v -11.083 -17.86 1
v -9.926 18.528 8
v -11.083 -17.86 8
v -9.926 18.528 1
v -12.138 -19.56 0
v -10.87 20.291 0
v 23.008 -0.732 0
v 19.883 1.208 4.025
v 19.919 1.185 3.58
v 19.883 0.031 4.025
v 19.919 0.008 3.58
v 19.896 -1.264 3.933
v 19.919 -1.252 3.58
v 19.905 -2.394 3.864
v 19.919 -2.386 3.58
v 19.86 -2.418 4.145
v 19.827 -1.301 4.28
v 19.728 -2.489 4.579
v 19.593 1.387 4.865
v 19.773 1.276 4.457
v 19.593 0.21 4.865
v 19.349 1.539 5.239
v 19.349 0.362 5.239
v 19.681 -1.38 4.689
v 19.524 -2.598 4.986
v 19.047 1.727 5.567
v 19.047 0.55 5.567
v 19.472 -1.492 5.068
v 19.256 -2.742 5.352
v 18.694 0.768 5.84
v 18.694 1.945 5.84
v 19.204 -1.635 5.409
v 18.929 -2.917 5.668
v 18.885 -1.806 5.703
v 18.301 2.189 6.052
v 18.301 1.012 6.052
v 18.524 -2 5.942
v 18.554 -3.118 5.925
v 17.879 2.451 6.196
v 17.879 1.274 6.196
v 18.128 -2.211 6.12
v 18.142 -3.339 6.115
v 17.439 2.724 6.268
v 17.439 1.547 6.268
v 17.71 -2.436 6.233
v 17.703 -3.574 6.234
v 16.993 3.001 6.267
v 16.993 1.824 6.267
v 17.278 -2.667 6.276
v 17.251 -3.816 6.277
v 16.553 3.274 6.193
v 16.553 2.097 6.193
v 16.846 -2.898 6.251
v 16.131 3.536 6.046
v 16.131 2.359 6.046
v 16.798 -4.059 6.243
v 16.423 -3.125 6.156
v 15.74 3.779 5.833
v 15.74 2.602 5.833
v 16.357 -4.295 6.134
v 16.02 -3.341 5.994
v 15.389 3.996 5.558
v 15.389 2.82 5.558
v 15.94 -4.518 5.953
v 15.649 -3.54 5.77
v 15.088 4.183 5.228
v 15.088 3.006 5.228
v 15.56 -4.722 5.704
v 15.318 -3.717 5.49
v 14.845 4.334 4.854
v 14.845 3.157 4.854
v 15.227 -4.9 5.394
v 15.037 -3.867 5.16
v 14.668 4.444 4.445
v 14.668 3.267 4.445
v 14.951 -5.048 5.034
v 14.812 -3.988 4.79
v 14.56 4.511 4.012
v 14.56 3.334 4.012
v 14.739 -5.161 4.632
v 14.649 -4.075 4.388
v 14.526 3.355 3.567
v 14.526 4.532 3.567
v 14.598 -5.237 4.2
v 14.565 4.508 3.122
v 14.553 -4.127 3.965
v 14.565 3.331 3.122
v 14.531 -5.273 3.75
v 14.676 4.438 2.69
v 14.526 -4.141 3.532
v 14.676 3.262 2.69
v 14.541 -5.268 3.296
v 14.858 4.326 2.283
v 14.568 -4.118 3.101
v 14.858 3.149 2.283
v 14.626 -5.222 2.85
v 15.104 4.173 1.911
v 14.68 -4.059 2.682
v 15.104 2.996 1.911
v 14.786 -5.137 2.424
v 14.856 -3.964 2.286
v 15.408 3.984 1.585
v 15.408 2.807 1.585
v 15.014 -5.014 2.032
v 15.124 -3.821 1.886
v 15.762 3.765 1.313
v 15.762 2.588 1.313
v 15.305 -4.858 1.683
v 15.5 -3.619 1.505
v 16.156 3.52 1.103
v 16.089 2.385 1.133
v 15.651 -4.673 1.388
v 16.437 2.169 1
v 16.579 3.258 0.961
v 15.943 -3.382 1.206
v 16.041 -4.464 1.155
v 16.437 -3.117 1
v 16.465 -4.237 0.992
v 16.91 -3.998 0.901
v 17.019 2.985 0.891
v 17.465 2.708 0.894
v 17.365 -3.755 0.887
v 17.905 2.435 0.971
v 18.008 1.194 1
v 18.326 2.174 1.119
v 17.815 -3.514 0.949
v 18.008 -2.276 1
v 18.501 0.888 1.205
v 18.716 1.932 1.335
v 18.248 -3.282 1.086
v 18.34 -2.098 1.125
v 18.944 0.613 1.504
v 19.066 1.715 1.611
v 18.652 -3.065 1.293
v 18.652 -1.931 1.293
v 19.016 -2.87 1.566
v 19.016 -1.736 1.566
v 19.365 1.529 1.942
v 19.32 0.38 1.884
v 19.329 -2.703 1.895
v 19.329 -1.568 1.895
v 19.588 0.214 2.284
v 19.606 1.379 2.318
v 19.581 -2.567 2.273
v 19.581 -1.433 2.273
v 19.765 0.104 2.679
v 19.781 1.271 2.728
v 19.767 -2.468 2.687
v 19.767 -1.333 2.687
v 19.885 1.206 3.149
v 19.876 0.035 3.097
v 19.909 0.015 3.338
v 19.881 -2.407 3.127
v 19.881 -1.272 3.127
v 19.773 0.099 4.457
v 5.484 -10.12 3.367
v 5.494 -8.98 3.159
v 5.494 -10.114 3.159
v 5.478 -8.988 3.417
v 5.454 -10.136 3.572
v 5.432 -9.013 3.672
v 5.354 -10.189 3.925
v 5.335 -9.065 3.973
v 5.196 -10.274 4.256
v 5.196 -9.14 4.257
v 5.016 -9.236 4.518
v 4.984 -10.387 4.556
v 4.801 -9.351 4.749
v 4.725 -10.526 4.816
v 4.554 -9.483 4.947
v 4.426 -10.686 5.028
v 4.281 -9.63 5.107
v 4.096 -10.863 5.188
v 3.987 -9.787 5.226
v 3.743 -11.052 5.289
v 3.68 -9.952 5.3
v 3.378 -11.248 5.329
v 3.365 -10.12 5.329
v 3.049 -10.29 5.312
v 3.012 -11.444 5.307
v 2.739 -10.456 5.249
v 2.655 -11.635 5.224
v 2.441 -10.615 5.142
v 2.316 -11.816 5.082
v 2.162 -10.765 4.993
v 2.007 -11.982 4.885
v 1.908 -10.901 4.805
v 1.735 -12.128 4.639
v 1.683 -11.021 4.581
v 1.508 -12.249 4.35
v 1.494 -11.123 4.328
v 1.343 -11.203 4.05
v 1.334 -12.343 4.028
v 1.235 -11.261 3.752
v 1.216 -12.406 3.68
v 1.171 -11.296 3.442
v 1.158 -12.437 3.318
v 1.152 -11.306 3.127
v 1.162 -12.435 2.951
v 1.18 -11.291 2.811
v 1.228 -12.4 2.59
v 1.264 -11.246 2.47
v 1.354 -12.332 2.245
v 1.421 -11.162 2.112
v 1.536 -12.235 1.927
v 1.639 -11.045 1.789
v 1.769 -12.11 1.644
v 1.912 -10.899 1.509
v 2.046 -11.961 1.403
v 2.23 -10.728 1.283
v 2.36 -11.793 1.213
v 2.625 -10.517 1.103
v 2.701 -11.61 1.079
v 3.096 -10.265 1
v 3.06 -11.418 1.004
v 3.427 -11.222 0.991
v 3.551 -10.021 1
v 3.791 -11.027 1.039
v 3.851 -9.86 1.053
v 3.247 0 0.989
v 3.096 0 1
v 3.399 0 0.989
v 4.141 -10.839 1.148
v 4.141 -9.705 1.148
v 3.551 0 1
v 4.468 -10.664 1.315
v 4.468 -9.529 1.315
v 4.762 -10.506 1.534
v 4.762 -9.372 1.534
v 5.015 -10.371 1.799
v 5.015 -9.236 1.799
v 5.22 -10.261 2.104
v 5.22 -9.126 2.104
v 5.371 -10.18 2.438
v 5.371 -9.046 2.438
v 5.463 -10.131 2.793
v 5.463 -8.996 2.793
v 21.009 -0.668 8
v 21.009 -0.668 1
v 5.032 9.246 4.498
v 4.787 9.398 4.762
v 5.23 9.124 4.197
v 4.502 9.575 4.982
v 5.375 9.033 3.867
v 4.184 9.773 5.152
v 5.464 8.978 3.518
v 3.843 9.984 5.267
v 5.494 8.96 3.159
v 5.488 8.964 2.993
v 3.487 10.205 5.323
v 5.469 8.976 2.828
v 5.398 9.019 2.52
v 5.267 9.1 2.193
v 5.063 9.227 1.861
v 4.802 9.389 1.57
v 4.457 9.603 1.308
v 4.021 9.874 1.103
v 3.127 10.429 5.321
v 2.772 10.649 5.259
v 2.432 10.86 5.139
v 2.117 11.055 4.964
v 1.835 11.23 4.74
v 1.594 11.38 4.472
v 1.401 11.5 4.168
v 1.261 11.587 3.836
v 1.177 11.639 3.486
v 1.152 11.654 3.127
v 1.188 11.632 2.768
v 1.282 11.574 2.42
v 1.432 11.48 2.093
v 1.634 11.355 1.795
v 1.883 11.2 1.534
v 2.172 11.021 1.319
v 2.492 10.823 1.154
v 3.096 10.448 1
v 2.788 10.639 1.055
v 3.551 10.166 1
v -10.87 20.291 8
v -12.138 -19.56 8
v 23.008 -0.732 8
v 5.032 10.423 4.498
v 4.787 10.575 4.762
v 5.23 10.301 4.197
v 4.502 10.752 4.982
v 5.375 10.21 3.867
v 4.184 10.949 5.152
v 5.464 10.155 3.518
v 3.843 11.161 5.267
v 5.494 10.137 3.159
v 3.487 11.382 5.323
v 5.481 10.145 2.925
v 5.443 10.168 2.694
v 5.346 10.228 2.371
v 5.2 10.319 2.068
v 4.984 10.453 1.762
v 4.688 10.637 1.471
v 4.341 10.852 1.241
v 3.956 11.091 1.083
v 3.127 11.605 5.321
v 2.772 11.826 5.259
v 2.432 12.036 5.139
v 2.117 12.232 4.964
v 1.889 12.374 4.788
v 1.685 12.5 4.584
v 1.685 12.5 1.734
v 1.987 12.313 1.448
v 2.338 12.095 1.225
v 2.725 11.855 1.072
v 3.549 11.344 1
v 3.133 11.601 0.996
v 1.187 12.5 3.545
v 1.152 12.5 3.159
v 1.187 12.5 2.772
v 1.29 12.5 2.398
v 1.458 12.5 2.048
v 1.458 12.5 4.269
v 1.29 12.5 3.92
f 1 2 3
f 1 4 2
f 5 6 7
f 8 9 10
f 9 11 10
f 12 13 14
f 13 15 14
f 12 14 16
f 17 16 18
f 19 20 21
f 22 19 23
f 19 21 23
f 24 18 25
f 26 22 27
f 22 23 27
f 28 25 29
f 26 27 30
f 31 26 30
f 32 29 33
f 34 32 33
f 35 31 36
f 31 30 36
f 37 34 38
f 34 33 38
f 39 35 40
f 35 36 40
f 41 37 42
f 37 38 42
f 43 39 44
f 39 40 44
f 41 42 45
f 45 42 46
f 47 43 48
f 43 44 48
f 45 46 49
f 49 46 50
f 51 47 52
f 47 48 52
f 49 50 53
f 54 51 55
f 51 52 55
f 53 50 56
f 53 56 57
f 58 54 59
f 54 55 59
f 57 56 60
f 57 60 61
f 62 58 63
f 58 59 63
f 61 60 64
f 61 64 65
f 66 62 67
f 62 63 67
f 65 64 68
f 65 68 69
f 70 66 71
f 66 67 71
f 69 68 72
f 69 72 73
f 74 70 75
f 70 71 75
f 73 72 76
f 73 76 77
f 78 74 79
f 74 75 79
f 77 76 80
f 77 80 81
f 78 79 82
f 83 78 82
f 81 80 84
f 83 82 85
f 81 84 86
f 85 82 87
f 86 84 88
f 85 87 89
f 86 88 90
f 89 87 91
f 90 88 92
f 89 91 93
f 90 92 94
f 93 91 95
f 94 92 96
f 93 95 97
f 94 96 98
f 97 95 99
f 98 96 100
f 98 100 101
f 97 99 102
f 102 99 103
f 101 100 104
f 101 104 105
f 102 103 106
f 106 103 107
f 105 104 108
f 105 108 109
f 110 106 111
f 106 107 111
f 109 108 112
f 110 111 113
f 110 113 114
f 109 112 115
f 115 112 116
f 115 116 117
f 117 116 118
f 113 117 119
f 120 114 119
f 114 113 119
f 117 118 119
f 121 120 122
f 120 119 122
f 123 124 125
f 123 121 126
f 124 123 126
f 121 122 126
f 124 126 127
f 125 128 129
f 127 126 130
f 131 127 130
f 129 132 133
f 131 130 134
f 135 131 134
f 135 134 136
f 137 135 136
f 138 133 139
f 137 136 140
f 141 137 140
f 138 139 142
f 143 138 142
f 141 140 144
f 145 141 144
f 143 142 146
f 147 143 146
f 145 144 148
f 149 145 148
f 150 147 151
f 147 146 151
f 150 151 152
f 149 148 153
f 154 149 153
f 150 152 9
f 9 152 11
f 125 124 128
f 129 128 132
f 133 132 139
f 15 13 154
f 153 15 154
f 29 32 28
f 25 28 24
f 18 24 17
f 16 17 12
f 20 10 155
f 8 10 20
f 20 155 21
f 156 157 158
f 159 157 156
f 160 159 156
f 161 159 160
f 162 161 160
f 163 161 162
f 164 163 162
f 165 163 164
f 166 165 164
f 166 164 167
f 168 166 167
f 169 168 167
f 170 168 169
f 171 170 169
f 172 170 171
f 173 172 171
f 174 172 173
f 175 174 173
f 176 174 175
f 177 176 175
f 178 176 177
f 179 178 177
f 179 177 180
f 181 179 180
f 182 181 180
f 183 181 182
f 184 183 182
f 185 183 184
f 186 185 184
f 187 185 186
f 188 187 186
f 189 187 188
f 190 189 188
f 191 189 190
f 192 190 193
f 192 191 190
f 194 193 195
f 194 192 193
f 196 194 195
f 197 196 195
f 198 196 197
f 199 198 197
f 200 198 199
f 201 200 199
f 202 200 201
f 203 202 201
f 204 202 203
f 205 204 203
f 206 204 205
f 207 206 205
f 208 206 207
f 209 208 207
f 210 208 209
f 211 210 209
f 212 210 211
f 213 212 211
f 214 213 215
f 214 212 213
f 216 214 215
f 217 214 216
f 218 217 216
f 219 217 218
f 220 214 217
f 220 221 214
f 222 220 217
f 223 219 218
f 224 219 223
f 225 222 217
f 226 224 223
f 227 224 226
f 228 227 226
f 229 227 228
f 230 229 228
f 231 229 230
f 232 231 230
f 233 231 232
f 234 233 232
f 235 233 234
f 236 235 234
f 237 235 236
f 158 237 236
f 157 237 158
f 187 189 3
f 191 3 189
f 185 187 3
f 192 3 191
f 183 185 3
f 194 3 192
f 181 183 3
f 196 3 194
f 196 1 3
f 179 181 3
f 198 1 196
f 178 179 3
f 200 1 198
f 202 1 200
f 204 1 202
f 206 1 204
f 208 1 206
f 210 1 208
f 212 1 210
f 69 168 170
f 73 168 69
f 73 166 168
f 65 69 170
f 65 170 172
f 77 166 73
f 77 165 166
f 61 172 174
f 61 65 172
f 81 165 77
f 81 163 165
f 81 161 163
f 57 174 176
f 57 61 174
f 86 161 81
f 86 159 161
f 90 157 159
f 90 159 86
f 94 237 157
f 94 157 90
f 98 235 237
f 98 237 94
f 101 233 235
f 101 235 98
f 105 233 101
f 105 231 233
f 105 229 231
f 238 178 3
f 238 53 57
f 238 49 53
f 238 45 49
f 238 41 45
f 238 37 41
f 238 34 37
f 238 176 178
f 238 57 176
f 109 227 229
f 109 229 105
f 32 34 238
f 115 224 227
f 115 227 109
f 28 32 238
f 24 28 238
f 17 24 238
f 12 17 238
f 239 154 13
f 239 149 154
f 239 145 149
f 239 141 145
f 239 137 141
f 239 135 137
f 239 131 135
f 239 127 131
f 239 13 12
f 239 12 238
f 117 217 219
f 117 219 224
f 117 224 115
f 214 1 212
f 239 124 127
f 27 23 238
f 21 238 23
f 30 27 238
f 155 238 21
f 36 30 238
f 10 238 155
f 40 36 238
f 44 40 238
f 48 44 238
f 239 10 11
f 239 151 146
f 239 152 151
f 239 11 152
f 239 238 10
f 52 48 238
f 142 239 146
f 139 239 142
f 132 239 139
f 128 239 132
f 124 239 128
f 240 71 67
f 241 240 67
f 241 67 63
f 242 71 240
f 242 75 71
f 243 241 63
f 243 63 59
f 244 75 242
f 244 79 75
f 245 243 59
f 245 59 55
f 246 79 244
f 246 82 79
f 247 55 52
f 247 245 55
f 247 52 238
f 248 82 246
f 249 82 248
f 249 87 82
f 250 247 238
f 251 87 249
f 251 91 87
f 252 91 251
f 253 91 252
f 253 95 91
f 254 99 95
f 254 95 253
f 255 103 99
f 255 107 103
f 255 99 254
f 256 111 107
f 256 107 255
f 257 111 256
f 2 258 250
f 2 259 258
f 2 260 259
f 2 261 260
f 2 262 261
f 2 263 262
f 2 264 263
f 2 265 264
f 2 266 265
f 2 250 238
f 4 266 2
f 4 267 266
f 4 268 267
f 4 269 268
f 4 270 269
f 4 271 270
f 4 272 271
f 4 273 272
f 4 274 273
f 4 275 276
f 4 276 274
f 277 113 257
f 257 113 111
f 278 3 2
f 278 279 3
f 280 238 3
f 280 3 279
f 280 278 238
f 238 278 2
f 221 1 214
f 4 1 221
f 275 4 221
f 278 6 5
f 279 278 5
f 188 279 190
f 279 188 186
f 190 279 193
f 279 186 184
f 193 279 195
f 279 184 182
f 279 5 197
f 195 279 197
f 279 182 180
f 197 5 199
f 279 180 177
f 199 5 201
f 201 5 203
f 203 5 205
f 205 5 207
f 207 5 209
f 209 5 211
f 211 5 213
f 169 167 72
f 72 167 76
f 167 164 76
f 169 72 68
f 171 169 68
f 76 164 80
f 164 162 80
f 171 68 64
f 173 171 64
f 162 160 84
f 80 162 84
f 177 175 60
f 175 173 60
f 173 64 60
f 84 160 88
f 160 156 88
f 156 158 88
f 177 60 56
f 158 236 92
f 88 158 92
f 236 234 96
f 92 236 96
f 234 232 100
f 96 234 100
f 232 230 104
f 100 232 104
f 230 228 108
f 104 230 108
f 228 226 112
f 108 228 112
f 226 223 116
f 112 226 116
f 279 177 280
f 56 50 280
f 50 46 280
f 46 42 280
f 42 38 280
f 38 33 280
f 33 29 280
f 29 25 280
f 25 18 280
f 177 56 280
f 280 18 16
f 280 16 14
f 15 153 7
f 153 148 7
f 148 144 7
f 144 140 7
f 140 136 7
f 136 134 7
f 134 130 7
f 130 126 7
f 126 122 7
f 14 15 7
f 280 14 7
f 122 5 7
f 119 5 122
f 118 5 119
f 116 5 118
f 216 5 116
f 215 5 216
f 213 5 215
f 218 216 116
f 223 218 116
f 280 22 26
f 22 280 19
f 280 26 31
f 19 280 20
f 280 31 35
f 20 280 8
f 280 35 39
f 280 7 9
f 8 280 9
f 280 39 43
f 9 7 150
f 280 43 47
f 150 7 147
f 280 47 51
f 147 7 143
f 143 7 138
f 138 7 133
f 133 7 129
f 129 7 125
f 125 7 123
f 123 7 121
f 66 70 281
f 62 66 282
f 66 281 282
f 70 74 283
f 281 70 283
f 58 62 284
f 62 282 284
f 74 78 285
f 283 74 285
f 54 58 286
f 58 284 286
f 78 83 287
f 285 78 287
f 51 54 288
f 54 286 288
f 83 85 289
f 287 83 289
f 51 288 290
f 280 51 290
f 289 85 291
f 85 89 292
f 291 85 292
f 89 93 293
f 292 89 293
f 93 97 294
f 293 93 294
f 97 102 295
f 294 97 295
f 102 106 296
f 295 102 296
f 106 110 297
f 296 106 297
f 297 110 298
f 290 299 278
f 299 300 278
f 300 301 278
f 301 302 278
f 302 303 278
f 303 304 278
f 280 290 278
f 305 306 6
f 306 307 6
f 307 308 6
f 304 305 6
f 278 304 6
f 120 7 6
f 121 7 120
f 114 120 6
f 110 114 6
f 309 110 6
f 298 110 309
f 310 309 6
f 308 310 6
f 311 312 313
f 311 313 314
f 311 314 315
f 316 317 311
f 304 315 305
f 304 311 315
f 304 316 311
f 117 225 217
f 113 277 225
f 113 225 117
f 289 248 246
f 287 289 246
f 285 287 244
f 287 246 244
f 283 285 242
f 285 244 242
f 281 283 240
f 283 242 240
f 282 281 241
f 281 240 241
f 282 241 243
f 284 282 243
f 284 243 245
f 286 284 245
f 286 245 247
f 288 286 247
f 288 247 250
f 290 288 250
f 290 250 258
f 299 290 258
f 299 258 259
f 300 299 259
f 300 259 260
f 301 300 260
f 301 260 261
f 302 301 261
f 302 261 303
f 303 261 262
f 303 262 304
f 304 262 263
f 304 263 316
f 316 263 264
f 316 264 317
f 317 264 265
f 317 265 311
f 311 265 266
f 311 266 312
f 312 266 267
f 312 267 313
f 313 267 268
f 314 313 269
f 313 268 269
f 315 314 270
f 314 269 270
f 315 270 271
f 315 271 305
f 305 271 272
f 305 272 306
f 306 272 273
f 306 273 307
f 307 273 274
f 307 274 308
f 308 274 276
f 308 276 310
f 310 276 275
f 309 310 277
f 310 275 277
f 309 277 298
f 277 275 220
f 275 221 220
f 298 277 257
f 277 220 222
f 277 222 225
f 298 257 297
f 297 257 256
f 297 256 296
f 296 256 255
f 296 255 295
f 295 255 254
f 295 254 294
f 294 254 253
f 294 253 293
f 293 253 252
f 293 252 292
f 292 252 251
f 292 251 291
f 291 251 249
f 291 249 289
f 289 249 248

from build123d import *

# Parameters (mm, degrees)
F1_DEPTH = 8
F2_T     = -1
F3_R     = 2.170794
F3_R_2   = 2.696969
F4_DEPTH = 12.5


with BuildPart() as f1:
    # F0 (on Top) → F1 (new body)
    with BuildSketch(Plane.XY):
        Polygon((-12.137679, -19.559744), (23.008074, -0.731667), (-10.870395, 20.29141), align=None)
    extrude(amount=F1_DEPTH)

    # F2
    f2_openings = [f1.faces().sort_by_distance(p)[0] for p in [
        (0, 0, 8),
    ]]
    offset(amount=F2_T, openings=f2_openings)

    # F3 (on Front) → F4 (cut, symmetric)
    with BuildSketch(Plane.XZ):
        with Locations((3.323053, 3.15884)):
            Circle(F3_R)
        with Locations((17.222516, 3.580036)):
            Circle(F3_R_2)
    extrude(amount=F4_DEPTH, both=True, mode=Mode.SUBTRACT)


solid = f1.part
